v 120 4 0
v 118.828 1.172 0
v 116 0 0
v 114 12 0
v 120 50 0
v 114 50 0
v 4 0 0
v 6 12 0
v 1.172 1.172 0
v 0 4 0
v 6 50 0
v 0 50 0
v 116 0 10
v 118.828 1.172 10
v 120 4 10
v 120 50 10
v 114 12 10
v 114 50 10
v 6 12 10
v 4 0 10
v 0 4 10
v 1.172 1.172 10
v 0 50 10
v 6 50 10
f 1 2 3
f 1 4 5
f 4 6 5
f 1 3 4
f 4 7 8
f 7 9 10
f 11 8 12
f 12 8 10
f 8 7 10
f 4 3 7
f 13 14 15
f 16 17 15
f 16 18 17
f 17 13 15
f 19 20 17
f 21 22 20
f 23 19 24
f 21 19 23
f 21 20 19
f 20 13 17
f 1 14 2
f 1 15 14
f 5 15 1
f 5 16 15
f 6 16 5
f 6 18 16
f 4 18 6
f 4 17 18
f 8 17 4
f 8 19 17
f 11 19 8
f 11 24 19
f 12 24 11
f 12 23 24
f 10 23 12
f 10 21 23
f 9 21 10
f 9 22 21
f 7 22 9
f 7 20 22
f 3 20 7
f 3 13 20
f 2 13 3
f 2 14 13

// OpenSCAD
$fn = 32;

// ----------------------------------------------------------------------
// Heat sink frame: 120 x 50 mm frame, 6 mm walls
// ----------------------------------------------------------------------

// --- parameters (mm) ---
profile_height = 10;      // extrusion height
profile_points = 12;      // points of the closed outline

profile = [[0, 4], [1.172, 1.172], [4, 0], [116, 0], [118.828, 1.172], [120, 4], [120, 50], [114, 50], [114, 12], [6, 12], [6, 50], [0, 50]];  // single closed polygon, 12 points, counter clockwise

// --- the one profile operation ---
linear_extrude(height = profile_height) polygon(points = profile);
